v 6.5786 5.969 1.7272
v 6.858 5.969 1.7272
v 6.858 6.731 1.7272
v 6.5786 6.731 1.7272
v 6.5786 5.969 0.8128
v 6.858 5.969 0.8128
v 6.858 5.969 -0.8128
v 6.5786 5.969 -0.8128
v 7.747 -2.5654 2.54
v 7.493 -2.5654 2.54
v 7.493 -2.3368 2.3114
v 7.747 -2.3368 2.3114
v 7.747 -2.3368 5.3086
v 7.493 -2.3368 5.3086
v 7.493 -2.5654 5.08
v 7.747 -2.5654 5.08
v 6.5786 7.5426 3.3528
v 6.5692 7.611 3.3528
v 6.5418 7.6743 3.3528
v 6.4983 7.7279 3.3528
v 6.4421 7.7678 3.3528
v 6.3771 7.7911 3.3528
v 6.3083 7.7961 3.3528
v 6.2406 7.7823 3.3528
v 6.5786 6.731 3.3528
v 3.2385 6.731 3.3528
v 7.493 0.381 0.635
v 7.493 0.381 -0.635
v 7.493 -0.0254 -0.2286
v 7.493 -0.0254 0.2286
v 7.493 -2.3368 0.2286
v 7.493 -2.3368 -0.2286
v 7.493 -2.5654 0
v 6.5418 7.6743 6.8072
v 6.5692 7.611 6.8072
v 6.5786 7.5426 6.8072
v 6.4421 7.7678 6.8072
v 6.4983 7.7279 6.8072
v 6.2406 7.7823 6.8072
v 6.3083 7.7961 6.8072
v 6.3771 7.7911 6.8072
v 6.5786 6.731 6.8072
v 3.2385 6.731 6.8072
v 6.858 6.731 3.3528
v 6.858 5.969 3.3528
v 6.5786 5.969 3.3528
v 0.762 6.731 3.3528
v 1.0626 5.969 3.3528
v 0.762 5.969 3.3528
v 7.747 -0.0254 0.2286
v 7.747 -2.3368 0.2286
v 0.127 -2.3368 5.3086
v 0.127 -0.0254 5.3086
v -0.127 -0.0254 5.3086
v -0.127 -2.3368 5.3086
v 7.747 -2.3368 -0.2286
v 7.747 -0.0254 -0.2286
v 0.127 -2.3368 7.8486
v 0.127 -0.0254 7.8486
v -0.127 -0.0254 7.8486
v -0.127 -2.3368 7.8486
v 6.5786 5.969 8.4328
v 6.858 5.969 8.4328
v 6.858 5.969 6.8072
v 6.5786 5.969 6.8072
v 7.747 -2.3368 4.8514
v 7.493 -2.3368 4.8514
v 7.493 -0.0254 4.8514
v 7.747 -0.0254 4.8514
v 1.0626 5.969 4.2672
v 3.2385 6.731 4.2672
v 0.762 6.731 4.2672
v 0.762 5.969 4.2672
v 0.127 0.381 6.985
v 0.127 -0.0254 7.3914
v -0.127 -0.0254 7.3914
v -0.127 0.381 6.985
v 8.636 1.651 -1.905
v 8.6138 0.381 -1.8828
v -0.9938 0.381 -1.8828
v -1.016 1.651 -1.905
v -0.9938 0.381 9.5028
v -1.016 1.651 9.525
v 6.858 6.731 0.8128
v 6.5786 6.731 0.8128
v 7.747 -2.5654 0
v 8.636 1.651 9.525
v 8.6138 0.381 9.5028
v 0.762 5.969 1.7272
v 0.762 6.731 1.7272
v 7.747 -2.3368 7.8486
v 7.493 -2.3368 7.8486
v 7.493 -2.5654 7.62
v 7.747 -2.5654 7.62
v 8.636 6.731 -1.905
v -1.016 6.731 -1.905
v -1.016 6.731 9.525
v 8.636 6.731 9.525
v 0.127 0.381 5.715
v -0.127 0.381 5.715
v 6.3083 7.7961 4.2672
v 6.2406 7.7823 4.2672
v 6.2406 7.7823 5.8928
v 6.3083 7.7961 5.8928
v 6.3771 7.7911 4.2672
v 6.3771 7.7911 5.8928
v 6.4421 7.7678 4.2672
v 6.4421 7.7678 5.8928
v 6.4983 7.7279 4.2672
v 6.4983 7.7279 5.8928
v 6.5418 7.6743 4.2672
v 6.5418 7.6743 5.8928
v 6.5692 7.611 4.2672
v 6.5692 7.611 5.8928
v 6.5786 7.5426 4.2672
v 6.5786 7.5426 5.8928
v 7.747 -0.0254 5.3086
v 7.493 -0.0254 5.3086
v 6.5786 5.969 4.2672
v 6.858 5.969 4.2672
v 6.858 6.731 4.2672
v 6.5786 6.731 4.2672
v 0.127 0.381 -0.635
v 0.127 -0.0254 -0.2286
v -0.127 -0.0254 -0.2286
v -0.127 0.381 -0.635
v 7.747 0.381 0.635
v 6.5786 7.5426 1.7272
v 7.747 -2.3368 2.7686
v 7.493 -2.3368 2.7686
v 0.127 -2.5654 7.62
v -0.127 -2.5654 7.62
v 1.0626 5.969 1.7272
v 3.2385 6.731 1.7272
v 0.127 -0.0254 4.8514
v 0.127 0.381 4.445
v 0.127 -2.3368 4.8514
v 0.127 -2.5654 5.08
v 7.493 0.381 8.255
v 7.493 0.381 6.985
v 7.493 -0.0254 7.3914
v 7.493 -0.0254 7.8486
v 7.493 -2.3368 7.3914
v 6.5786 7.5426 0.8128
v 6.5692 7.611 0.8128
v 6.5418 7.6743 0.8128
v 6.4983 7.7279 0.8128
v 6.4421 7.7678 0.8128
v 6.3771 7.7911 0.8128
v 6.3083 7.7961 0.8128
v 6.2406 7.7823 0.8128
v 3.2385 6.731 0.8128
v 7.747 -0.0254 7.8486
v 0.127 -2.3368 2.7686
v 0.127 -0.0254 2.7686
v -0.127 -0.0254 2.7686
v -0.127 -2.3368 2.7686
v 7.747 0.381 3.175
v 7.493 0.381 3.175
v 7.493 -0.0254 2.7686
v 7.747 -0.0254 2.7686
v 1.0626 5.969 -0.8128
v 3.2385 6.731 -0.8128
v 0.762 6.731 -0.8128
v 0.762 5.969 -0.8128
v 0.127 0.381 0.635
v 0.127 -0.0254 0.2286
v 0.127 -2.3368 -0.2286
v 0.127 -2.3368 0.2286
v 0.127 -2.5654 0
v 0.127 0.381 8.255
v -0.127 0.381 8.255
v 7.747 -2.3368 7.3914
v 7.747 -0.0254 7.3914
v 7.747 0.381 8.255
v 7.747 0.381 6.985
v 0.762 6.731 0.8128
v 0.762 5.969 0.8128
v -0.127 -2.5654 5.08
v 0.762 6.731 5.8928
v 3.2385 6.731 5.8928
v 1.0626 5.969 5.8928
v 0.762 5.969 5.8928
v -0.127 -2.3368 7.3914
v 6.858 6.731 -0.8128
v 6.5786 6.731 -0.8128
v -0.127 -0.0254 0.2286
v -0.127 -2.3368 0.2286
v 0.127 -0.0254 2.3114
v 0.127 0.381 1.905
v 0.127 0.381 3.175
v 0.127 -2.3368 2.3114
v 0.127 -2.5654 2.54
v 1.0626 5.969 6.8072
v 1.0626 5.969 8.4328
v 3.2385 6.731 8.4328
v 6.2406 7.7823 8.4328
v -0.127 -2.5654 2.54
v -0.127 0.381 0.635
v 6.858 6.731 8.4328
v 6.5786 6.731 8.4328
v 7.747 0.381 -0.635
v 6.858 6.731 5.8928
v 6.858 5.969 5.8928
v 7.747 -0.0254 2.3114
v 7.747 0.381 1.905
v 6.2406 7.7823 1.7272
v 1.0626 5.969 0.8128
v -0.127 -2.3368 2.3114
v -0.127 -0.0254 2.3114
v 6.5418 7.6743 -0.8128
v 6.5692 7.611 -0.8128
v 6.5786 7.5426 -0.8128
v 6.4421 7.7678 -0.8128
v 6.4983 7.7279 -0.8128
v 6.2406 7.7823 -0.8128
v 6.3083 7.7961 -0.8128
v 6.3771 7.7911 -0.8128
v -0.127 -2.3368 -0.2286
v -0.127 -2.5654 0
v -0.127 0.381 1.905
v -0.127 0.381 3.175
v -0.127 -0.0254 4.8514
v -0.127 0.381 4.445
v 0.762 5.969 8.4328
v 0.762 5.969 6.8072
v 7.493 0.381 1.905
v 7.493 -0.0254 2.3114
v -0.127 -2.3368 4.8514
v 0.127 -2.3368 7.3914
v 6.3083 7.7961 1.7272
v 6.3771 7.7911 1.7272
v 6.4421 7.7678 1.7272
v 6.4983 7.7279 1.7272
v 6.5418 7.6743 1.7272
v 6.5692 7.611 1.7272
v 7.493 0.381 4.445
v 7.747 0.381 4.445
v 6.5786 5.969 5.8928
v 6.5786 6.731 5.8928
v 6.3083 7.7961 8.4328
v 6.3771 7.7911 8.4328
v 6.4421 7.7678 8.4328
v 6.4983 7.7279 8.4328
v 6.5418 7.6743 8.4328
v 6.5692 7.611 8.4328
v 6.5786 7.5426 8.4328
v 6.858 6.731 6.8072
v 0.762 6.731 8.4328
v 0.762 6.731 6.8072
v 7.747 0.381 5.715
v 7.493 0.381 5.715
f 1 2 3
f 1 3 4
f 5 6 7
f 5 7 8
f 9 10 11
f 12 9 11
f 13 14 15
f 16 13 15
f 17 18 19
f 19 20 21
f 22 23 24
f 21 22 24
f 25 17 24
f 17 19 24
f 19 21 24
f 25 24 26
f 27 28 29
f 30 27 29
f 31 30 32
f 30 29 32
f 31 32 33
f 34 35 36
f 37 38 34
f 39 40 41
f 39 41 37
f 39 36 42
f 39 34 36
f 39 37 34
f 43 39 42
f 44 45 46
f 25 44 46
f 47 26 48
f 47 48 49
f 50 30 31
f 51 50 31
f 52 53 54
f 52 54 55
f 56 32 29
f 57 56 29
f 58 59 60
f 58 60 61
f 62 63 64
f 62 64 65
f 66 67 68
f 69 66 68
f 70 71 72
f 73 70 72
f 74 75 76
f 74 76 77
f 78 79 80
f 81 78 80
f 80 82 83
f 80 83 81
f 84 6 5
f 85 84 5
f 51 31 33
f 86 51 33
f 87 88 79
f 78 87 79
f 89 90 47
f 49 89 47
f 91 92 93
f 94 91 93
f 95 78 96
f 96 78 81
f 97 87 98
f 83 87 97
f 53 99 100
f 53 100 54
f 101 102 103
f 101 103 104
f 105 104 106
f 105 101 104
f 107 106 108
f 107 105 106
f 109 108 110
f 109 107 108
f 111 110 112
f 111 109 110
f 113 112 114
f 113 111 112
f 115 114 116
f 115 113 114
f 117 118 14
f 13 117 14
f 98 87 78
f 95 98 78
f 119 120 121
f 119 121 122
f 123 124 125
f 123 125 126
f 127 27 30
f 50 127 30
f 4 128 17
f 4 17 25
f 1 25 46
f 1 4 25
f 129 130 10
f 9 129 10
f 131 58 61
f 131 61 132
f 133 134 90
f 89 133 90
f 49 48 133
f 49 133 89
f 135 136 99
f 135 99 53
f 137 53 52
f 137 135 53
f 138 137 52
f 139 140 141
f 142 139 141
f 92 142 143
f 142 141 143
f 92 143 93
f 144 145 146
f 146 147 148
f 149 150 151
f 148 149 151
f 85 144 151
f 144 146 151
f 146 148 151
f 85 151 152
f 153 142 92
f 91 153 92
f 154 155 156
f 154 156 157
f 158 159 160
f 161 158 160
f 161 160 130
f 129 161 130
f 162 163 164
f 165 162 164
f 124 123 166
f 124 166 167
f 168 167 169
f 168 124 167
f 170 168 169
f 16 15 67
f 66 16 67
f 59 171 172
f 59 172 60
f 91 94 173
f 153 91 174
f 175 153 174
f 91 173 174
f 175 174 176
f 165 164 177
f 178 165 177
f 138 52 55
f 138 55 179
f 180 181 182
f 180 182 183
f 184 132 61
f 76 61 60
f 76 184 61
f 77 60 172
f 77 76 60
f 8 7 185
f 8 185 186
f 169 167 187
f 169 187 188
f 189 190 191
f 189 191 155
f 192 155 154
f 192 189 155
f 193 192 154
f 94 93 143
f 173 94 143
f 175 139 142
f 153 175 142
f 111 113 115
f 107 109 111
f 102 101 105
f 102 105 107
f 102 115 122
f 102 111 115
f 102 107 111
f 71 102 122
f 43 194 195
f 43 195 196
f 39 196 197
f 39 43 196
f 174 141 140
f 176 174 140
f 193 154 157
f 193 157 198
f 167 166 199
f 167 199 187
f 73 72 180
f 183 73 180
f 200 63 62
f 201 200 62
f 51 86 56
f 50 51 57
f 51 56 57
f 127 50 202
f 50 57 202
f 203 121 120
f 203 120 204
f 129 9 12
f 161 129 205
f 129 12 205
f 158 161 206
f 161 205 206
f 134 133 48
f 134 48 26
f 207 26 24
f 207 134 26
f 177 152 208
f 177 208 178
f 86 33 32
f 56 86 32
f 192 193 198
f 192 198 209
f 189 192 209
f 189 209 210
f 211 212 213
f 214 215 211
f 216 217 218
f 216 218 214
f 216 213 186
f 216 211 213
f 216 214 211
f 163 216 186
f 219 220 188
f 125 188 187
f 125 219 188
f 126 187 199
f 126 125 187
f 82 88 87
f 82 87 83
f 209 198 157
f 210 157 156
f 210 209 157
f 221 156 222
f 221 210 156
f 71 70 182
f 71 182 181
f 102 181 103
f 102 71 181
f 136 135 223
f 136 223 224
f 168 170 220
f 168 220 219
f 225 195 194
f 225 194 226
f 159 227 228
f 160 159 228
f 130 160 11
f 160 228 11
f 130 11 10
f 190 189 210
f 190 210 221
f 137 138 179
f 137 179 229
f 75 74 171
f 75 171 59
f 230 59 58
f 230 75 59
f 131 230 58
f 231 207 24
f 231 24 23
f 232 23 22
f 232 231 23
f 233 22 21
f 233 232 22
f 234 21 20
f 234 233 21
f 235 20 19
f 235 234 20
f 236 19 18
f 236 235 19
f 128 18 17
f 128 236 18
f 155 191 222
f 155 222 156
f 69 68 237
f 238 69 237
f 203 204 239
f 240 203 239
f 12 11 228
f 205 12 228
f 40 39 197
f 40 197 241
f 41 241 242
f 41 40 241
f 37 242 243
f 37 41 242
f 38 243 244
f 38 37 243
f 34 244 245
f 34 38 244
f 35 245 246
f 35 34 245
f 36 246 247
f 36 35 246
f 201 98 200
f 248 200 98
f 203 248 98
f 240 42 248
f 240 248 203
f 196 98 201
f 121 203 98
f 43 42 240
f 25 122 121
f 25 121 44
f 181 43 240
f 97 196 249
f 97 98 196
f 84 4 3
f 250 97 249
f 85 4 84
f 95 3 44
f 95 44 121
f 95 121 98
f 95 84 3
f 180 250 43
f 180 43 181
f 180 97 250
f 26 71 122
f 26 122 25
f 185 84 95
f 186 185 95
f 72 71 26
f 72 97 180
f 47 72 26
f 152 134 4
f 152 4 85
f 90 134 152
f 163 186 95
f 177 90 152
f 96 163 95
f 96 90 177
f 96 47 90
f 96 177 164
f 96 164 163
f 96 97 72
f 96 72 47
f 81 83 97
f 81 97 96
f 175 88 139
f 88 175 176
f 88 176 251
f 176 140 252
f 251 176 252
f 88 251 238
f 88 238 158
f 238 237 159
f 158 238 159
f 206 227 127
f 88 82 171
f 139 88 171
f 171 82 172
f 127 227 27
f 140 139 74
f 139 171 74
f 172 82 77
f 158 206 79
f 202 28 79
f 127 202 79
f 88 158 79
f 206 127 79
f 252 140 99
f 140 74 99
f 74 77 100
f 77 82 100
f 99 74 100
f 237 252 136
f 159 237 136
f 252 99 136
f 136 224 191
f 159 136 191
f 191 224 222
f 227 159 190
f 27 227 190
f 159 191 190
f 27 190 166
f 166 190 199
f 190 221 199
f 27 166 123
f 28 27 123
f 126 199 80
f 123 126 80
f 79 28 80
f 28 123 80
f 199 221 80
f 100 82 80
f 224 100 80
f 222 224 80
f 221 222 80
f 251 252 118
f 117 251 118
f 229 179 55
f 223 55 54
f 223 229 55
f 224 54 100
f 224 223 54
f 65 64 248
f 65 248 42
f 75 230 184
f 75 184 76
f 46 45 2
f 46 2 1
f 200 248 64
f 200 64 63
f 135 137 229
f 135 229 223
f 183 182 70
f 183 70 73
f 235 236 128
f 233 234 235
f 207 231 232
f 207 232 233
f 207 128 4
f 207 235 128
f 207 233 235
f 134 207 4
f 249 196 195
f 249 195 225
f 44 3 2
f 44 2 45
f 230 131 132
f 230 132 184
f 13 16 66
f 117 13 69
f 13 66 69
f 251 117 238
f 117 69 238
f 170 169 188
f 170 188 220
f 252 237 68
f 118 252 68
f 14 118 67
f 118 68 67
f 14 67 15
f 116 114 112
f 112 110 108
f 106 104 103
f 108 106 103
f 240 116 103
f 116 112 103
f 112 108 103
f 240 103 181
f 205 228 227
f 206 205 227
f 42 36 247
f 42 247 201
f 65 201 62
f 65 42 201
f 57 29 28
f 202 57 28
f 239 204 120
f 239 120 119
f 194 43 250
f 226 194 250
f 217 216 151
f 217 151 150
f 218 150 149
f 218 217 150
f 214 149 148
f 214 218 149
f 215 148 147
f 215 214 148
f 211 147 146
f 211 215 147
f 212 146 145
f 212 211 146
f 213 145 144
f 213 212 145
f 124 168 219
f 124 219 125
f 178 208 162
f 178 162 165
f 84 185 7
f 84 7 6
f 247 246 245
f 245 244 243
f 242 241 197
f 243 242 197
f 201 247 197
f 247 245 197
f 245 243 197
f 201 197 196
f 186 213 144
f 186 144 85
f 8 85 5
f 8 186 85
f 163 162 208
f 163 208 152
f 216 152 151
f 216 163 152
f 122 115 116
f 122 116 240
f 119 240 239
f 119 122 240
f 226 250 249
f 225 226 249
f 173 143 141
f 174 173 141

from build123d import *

# Parameters (mm, degrees)
SKETCH1_W                = 11.43
SKETCH1_H                = 9.652
BASE_EXTRUDE_DEPTH       = 6.35
CHAMFER1_SIZE2           = 0.022167932
CHAMFER1_SIZE            = 1.27
BOSS_EXTRUDE_THIN1_DEPTH = 0.635
CUT_EXTRUDE1_DEPTH       = 2.143
CUT_EXTRUDE2_DEPTH       = 2.143
LPATTERN2_COUNT          = 4
LPATTERN2_PITCH          = 2.54
MIRROR1_COPY_1_DEPTH     = 0.635
MIRROR1_COPY_2_DEPTH     = 0.635
MIRROR1_COPY_3_DEPTH     = 0.635
MIRROR1_COPY_4_DEPTH     = 2.143
MIRROR1_COPY_5_DEPTH     = 2.143
MIRROR1_COPY_6_DEPTH     = 2.143
MIRROR1_COPY_7_DEPTH     = 2.143
MIRROR1_COPY_8_DEPTH     = 2.143
MIRROR1_COPY_9_DEPTH     = 2.143
SKETCH6_W                = 6.096
SKETCH6_H                = 1.6256
CUT_EXTRUDE3_DEPTH       = 0.762
BOSS_EXTRUDE1_DEPTH      = 1.6256
LPATTERN3_COUNT          = 4
LPATTERN3_PITCH          = 2.54


with BuildPart() as part:
    # Sketch1 → Base-Extrude (new body)
    with BuildSketch(Plane(origin=(0, 0.381, 0), x_dir=(0, 0, -1), z_dir=(0, 1, 0))):
        with Locations((-3.81, -3.81)):
            Rectangle(SKETCH1_W, SKETCH1_H)
    extrude(amount=BASE_EXTRUDE_DEPTH)

    # Chamfer1
    chamfer1_edges = [part.edges().sort_by_distance(p)[0] for p in [
        (8.636, 0.381, 3.81),
        (3.81, 0.381, 9.525),
        (-1.016, 0.381, 3.81),
        (3.81, 0.381, -1.905),
    ]]
    chamfer(chamfer1_edges, length=CHAMFER1_SIZE, length2=CHAMFER1_SIZE2)

    # Sketch3 → Boss-Extrude-Thin1 (add, symmetric)
    with BuildSketch(Plane(origin=(10.541, 0, 0), x_dir=(-1, 0, 0), z_dir=(0, 0, -1))):
        with BuildLine():
            Line((9.271, 1.8796), (10.033, 1.8796))
            ThreePointArc((10.033, 1.8796), (10.302407684, 1.768007684), (10.414, 1.4986))
            Line((10.414, 1.4986), (10.414, -2.5654))
            Line((10.414, -2.5654), (10.668, -2.5654))
            Line((10.668, -2.5654), (10.668, 1.4986))
            ThreePointArc((10.668, 1.4986), (10.482012806, 1.947612806), (10.033, 2.1336))
            Line((10.033, 2.1336), (9.271, 2.1336))
            Line((9.271, 2.1336), (9.271, 1.8796))
        make_face()
    boss_extrude_thin1 = extrude(amount=BOSS_EXTRUDE_THIN1_DEPTH, both=True)

    # Sketch4 → Cut-Extrude1 (cut, through all)
    with BuildSketch(Plane(origin=(0.127, 0, 0), x_dir=(0, 0, -1), z_dir=(1, 0, 0))):
        Polygon((0.635, -2.5654), (0, -2.5654), (0.2286, -2.3368), (0.2286, -0.0254), (0.635, 0.381), align=None)
    cut_extrude1 = extrude(amount=-CUT_EXTRUDE1_DEPTH, mode=Mode.SUBTRACT)

    # Sketch5 → Cut-Extrude2 (cut, through all)
    with BuildSketch(Plane(origin=(0.127, 0, 0), x_dir=(0, 0, -1), z_dir=(1, 0, 0))):
        Polygon((-0.635, 0.381), (-0.2286, -0.0254), (-0.2286, -2.3368), (0, -2.5654), (-0.635, -2.5654), align=None)
    cut_extrude2 = extrude(amount=-CUT_EXTRUDE2_DEPTH, mode=Mode.SUBTRACT)

    # LPattern2: Boss-Extrude-Thin1, Cut-Extrude1, Cut-Extrude2 ×4
    with Locations(*[(0, 0, i * LPATTERN2_PITCH) for i in range(1, LPATTERN2_COUNT)]):
        add(boss_extrude_thin1)
        add(cut_extrude1, mode=Mode.SUBTRACT)
        add(cut_extrude2, mode=Mode.SUBTRACT)

    # Mirror1: Boss-Extrude-Thin1, Cut-Extrude1, Cut-Extrude2 across plane
    add(boss_extrude_thin1.mirror(Plane.ZY.offset(-3.81)))
    add(cut_extrude1.mirror(Plane.ZY.offset(-3.81)), mode=Mode.SUBTRACT)
    add(cut_extrude2.mirror(Plane.ZY.offset(-3.81)), mode=Mode.SUBTRACT)

    # Mirror1 copy 1 sketch → Mirror1 copy 1 (add, symmetric)
    with BuildSketch(Plane(origin=(-2.921, 0, 2.54), x_dir=(1, 0, 0), z_dir=(0, 0, -1))):
        with BuildLine():
            Line((9.271, -1.8796), (10.033, -1.8796))
            ThreePointArc((10.033, -1.8796), (10.302407684, -1.768007684), (10.414, -1.4986))
            Line((10.414, -1.4986), (10.414, 2.5654))
            Line((10.414, 2.5654), (10.668, 2.5654))
            Line((10.668, 2.5654), (10.668, -1.4986))
            ThreePointArc((10.668, -1.4986), (10.482012806, -1.947612806), (10.033, -2.1336))
            Line((10.033, -2.1336), (9.271, -2.1336))
            Line((9.271, -2.1336), (9.271, -1.8796))
        make_face()
    extrude(amount=MIRROR1_COPY_1_DEPTH, both=True)

    # Mirror1 copy 2 sketch → Mirror1 copy 2 (add, symmetric)
    with BuildSketch(Plane(origin=(-2.921, 0, 5.08), x_dir=(1, 0, 0), z_dir=(0, 0, -1))):
        with BuildLine():
            Line((9.271, -1.8796), (10.033, -1.8796))
            ThreePointArc((10.033, -1.8796), (10.302407684, -1.768007684), (10.414, -1.4986))
            Line((10.414, -1.4986), (10.414, 2.5654))
            Line((10.414, 2.5654), (10.668, 2.5654))
            Line((10.668, 2.5654), (10.668, -1.4986))
            ThreePointArc((10.668, -1.4986), (10.482012806, -1.947612806), (10.033, -2.1336))
            Line((10.033, -2.1336), (9.271, -2.1336))
            Line((9.271, -2.1336), (9.271, -1.8796))
        make_face()
    extrude(amount=MIRROR1_COPY_2_DEPTH, both=True)

    # Mirror1 copy 3 sketch → Mirror1 copy 3 (add, symmetric)
    with BuildSketch(Plane(origin=(-2.921, 0, 7.62), x_dir=(1, 0, 0), z_dir=(0, 0, -1))):
        with BuildLine():
            Line((9.271, -1.8796), (10.033, -1.8796))
            ThreePointArc((10.033, -1.8796), (10.302407684, -1.768007684), (10.414, -1.4986))
            Line((10.414, -1.4986), (10.414, 2.5654))
            Line((10.414, 2.5654), (10.668, 2.5654))
            Line((10.668, 2.5654), (10.668, -1.4986))
            ThreePointArc((10.668, -1.4986), (10.482012806, -1.947612806), (10.033, -2.1336))
            Line((10.033, -2.1336), (9.271, -2.1336))
            Line((9.271, -2.1336), (9.271, -1.8796))
        make_face()
    extrude(amount=MIRROR1_COPY_3_DEPTH, both=True)

    # Mirror1 copy 4 sketch → Mirror1 copy 4 (cut, through all)
    with BuildSketch(Plane(origin=(7.493, 0, 2.54), x_dir=(0, 0, -1), z_dir=(-1, 0, 0))):
        Polygon((0.635, 2.5654), (0, 2.5654), (0.2286, 2.3368), (0.2286, 0.0254), (0.635, -0.381), align=None)
    extrude(amount=-MIRROR1_COPY_4_DEPTH, mode=Mode.SUBTRACT)

    # Mirror1 copy 5 sketch → Mirror1 copy 5 (cut, through all)
    with BuildSketch(Plane(origin=(7.493, 0, 5.08), x_dir=(0, 0, -1), z_dir=(-1, 0, 0))):
        Polygon((0.635, 2.5654), (0, 2.5654), (0.2286, 2.3368), (0.2286, 0.0254), (0.635, -0.381), align=None)
    extrude(amount=-MIRROR1_COPY_5_DEPTH, mode=Mode.SUBTRACT)

    # Mirror1 copy 6 sketch → Mirror1 copy 6 (cut, through all)
    with BuildSketch(Plane(origin=(7.493, 0, 7.62), x_dir=(0, 0, -1), z_dir=(-1, 0, 0))):
        Polygon((0.635, 2.5654), (0, 2.5654), (0.2286, 2.3368), (0.2286, 0.0254), (0.635, -0.381), align=None)
    extrude(amount=-MIRROR1_COPY_6_DEPTH, mode=Mode.SUBTRACT)

    # Mirror1 copy 7 sketch → Mirror1 copy 7 (cut, through all)
    with BuildSketch(Plane(origin=(7.493, 0, 2.54), x_dir=(0, 0, -1), z_dir=(-1, 0, 0))):
        Polygon((-0.635, -0.381), (-0.2286, 0.0254), (-0.2286, 2.3368), (0, 2.5654), (-0.635, 2.5654), align=None)
    extrude(amount=-MIRROR1_COPY_7_DEPTH, mode=Mode.SUBTRACT)

    # Mirror1 copy 8 sketch → Mirror1 copy 8 (cut, through all)
    with BuildSketch(Plane(origin=(7.493, 0, 5.08), x_dir=(0, 0, -1), z_dir=(-1, 0, 0))):
        Polygon((-0.635, -0.381), (-0.2286, 0.0254), (-0.2286, 2.3368), (0, 2.5654), (-0.635, 2.5654), align=None)
    extrude(amount=-MIRROR1_COPY_8_DEPTH, mode=Mode.SUBTRACT)

    # Mirror1 copy 9 sketch → Mirror1 copy 9 (cut, through all)
    with BuildSketch(Plane(origin=(7.493, 0, 7.62), x_dir=(0, 0, -1), z_dir=(-1, 0, 0))):
        Polygon((-0.635, -0.381), (-0.2286, 0.0254), (-0.2286, 2.3368), (0, 2.5654), (-0.635, 2.5654), align=None)
    extrude(amount=-MIRROR1_COPY_9_DEPTH, mode=Mode.SUBTRACT)

    # Sketch6 → Cut-Extrude3 (cut)
    with BuildSketch(Plane(origin=(0, 6.731, 0), x_dir=(-1, 0, 0), z_dir=(0, 1, 0))):
        with Locations((-3.81, 0)):
            Rectangle(SKETCH6_W, SKETCH6_H)
    cut_extrude3 = extrude(amount=-CUT_EXTRUDE3_DEPTH, mode=Mode.SUBTRACT)

    # Sketch7 → Boss-Extrude1 (add)
    with BuildSketch(Plane.XY.offset(-0.8128)):
        with BuildLine():
            Line((1.062579803, 5.969), (6.240649344, 7.782334164))
            ThreePointArc((6.240649344, 7.782334164), (6.471556683, 7.749779505), (6.5786, 7.542608722))
            Line((6.5786, 7.542608722), (6.5786, 5.969))
            Line((6.5786, 5.969), (1.062579803, 5.969))
        make_face()
    boss_extrude1 = extrude(amount=BOSS_EXTRUDE1_DEPTH)

    # LPattern3: Cut-Extrude3, Boss-Extrude1 ×4
    with Locations(*[(0, 0, i * LPATTERN3_PITCH) for i in range(1, LPATTERN3_COUNT)]):
        add(cut_extrude3, mode=Mode.SUBTRACT)
        add(boss_extrude1)


solid = part.part
